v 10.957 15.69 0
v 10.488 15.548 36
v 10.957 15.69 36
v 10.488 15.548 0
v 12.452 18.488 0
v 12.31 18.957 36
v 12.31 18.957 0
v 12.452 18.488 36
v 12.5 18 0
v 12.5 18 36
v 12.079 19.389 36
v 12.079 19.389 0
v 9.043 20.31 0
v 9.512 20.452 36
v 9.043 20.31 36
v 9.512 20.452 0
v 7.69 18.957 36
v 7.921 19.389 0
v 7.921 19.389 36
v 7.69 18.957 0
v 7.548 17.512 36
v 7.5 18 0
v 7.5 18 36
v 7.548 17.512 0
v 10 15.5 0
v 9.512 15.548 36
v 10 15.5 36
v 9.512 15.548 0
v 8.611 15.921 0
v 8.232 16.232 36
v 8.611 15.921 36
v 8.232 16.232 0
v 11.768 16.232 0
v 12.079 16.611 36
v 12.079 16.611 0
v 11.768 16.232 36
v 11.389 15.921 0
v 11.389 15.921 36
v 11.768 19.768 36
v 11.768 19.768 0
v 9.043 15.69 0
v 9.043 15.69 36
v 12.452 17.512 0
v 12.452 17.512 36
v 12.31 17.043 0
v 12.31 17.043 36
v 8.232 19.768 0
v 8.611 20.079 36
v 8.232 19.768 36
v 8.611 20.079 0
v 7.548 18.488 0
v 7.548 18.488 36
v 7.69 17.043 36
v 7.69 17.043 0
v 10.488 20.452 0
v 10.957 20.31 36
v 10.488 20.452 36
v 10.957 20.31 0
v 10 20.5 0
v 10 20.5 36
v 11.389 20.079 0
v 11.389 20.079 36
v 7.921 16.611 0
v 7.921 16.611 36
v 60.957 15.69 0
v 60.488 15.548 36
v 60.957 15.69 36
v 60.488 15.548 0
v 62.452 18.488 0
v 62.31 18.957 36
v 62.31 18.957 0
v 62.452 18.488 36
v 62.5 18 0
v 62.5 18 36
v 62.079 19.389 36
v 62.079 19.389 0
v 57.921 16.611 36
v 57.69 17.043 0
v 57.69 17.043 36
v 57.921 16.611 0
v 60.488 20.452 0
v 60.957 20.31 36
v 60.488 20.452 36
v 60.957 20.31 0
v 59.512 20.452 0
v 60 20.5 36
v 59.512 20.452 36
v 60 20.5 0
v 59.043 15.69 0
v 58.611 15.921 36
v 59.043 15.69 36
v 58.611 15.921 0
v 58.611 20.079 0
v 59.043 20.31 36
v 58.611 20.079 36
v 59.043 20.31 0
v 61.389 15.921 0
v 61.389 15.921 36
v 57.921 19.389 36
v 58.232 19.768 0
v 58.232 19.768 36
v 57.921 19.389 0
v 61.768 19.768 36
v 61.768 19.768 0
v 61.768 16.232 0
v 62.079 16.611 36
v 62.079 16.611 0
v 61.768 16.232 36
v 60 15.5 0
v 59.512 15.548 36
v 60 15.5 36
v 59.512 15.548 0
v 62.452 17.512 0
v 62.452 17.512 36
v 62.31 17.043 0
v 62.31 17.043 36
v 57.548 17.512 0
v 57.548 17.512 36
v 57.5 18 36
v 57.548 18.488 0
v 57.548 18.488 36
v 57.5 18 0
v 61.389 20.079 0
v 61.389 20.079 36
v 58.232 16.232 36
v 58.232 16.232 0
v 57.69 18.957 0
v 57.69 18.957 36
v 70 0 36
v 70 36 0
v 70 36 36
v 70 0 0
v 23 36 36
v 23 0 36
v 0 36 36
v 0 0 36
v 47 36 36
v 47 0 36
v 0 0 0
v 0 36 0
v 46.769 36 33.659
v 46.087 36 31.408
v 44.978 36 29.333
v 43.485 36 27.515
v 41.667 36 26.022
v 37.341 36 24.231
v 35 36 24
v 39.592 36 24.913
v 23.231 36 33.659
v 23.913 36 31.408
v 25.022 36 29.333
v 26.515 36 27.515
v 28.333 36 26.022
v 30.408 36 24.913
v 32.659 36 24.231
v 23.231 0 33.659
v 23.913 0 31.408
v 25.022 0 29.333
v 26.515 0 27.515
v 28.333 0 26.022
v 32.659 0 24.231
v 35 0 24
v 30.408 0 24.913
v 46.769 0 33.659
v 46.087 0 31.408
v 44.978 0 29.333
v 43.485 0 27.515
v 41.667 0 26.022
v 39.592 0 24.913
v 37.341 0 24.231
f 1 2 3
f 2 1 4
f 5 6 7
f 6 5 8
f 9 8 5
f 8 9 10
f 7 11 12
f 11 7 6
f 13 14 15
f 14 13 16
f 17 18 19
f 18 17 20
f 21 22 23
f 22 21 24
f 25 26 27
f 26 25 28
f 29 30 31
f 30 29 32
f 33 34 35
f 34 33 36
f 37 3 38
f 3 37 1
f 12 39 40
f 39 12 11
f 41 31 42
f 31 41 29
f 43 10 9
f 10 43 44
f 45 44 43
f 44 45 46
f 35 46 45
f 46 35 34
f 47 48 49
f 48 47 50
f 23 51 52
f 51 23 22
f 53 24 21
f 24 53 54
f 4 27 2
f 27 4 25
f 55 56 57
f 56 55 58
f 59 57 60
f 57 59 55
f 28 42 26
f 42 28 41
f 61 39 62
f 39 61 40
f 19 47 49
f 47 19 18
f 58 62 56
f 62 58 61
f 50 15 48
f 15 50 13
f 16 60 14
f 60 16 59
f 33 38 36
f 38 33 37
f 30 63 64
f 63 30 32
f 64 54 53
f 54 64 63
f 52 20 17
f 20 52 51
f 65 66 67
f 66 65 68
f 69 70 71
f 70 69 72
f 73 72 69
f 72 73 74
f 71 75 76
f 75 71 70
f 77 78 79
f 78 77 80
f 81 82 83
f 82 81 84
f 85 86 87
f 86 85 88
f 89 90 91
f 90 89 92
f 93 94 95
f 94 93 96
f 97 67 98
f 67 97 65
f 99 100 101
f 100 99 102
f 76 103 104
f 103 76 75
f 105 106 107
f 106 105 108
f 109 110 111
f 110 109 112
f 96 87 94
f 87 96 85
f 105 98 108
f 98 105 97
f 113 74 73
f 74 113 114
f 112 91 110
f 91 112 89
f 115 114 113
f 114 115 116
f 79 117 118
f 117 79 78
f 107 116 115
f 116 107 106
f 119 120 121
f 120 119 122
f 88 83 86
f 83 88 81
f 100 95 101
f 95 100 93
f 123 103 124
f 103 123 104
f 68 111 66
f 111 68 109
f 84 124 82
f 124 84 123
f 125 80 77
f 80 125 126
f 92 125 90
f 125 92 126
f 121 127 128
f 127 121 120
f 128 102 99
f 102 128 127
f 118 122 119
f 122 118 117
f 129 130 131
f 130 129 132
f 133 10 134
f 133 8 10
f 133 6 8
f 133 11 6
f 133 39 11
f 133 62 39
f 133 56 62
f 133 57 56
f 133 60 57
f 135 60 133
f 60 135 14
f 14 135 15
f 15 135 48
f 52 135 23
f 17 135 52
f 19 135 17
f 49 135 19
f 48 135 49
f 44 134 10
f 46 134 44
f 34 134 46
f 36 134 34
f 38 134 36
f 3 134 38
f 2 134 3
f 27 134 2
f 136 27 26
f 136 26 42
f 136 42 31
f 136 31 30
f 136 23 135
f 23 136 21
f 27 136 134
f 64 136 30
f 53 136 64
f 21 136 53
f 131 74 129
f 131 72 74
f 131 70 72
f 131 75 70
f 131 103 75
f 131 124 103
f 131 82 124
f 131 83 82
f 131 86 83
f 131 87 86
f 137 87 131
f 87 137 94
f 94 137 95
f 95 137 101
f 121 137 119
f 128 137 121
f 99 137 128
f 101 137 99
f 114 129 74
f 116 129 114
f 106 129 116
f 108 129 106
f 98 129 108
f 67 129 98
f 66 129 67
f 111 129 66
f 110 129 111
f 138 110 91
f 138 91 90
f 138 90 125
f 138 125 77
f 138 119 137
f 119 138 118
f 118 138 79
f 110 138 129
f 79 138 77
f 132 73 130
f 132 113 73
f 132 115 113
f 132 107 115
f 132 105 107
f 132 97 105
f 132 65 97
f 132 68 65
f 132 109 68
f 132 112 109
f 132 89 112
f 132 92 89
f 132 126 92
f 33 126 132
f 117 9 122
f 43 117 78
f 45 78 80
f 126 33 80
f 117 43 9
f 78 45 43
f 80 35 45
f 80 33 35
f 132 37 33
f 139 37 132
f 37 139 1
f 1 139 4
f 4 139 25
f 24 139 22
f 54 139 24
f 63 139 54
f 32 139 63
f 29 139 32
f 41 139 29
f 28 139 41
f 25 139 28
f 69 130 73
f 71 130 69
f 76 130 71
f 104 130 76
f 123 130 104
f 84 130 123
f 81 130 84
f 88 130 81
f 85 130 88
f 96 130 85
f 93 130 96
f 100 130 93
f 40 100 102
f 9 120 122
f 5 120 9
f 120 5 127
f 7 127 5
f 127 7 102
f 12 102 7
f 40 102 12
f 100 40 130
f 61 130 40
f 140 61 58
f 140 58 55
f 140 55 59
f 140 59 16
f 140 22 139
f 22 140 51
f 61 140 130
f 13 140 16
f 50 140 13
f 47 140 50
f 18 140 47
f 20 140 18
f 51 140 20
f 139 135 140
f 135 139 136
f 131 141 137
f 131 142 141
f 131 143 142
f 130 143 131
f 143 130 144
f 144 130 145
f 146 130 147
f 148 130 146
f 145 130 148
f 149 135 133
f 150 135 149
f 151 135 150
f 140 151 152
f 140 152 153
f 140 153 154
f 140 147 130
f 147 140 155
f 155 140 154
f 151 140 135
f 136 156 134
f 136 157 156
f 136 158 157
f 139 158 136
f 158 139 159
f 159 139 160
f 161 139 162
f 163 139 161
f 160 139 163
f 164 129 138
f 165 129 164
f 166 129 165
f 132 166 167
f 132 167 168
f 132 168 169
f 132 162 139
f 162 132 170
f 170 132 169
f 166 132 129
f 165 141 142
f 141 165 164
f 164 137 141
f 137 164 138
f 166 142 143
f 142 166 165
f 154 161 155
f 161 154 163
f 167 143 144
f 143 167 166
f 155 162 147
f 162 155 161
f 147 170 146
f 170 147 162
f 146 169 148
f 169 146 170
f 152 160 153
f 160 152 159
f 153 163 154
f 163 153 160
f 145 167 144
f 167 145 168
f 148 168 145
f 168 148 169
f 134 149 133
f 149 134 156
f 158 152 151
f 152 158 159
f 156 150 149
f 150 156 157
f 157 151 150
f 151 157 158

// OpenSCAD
$fn = 32;

// ----------------------------------------------------------------------
// Saddle clamp: plain shaft clamp
// ----------------------------------------------------------------------

// --- parameters (mm) ---
blk_l = 70;               // block length, X
blk_w = 36;               // block width, Y
blk_h = 36;               // block height
clamp_r = 12;             // shaft groove radius
hole_r = 2.5;             // bolt hole radius
hole_m = 10;              // bolt hole margin from the ends

saw_depth = clamp_r + 3;  // saw kerf depth

difference() {
  cube([blk_l, blk_w, blk_h]);
  translate([blk_l / 2, -1, blk_h])
    rotate([-90, 0, 0])
      cylinder(h = blk_w + 2, r = clamp_r);
  for (sx = [0, 1])
    translate([sx ? blk_l - hole_m : hole_m, blk_w / 2, -1])
      cylinder(r = hole_r, h = blk_h + 2);
}
